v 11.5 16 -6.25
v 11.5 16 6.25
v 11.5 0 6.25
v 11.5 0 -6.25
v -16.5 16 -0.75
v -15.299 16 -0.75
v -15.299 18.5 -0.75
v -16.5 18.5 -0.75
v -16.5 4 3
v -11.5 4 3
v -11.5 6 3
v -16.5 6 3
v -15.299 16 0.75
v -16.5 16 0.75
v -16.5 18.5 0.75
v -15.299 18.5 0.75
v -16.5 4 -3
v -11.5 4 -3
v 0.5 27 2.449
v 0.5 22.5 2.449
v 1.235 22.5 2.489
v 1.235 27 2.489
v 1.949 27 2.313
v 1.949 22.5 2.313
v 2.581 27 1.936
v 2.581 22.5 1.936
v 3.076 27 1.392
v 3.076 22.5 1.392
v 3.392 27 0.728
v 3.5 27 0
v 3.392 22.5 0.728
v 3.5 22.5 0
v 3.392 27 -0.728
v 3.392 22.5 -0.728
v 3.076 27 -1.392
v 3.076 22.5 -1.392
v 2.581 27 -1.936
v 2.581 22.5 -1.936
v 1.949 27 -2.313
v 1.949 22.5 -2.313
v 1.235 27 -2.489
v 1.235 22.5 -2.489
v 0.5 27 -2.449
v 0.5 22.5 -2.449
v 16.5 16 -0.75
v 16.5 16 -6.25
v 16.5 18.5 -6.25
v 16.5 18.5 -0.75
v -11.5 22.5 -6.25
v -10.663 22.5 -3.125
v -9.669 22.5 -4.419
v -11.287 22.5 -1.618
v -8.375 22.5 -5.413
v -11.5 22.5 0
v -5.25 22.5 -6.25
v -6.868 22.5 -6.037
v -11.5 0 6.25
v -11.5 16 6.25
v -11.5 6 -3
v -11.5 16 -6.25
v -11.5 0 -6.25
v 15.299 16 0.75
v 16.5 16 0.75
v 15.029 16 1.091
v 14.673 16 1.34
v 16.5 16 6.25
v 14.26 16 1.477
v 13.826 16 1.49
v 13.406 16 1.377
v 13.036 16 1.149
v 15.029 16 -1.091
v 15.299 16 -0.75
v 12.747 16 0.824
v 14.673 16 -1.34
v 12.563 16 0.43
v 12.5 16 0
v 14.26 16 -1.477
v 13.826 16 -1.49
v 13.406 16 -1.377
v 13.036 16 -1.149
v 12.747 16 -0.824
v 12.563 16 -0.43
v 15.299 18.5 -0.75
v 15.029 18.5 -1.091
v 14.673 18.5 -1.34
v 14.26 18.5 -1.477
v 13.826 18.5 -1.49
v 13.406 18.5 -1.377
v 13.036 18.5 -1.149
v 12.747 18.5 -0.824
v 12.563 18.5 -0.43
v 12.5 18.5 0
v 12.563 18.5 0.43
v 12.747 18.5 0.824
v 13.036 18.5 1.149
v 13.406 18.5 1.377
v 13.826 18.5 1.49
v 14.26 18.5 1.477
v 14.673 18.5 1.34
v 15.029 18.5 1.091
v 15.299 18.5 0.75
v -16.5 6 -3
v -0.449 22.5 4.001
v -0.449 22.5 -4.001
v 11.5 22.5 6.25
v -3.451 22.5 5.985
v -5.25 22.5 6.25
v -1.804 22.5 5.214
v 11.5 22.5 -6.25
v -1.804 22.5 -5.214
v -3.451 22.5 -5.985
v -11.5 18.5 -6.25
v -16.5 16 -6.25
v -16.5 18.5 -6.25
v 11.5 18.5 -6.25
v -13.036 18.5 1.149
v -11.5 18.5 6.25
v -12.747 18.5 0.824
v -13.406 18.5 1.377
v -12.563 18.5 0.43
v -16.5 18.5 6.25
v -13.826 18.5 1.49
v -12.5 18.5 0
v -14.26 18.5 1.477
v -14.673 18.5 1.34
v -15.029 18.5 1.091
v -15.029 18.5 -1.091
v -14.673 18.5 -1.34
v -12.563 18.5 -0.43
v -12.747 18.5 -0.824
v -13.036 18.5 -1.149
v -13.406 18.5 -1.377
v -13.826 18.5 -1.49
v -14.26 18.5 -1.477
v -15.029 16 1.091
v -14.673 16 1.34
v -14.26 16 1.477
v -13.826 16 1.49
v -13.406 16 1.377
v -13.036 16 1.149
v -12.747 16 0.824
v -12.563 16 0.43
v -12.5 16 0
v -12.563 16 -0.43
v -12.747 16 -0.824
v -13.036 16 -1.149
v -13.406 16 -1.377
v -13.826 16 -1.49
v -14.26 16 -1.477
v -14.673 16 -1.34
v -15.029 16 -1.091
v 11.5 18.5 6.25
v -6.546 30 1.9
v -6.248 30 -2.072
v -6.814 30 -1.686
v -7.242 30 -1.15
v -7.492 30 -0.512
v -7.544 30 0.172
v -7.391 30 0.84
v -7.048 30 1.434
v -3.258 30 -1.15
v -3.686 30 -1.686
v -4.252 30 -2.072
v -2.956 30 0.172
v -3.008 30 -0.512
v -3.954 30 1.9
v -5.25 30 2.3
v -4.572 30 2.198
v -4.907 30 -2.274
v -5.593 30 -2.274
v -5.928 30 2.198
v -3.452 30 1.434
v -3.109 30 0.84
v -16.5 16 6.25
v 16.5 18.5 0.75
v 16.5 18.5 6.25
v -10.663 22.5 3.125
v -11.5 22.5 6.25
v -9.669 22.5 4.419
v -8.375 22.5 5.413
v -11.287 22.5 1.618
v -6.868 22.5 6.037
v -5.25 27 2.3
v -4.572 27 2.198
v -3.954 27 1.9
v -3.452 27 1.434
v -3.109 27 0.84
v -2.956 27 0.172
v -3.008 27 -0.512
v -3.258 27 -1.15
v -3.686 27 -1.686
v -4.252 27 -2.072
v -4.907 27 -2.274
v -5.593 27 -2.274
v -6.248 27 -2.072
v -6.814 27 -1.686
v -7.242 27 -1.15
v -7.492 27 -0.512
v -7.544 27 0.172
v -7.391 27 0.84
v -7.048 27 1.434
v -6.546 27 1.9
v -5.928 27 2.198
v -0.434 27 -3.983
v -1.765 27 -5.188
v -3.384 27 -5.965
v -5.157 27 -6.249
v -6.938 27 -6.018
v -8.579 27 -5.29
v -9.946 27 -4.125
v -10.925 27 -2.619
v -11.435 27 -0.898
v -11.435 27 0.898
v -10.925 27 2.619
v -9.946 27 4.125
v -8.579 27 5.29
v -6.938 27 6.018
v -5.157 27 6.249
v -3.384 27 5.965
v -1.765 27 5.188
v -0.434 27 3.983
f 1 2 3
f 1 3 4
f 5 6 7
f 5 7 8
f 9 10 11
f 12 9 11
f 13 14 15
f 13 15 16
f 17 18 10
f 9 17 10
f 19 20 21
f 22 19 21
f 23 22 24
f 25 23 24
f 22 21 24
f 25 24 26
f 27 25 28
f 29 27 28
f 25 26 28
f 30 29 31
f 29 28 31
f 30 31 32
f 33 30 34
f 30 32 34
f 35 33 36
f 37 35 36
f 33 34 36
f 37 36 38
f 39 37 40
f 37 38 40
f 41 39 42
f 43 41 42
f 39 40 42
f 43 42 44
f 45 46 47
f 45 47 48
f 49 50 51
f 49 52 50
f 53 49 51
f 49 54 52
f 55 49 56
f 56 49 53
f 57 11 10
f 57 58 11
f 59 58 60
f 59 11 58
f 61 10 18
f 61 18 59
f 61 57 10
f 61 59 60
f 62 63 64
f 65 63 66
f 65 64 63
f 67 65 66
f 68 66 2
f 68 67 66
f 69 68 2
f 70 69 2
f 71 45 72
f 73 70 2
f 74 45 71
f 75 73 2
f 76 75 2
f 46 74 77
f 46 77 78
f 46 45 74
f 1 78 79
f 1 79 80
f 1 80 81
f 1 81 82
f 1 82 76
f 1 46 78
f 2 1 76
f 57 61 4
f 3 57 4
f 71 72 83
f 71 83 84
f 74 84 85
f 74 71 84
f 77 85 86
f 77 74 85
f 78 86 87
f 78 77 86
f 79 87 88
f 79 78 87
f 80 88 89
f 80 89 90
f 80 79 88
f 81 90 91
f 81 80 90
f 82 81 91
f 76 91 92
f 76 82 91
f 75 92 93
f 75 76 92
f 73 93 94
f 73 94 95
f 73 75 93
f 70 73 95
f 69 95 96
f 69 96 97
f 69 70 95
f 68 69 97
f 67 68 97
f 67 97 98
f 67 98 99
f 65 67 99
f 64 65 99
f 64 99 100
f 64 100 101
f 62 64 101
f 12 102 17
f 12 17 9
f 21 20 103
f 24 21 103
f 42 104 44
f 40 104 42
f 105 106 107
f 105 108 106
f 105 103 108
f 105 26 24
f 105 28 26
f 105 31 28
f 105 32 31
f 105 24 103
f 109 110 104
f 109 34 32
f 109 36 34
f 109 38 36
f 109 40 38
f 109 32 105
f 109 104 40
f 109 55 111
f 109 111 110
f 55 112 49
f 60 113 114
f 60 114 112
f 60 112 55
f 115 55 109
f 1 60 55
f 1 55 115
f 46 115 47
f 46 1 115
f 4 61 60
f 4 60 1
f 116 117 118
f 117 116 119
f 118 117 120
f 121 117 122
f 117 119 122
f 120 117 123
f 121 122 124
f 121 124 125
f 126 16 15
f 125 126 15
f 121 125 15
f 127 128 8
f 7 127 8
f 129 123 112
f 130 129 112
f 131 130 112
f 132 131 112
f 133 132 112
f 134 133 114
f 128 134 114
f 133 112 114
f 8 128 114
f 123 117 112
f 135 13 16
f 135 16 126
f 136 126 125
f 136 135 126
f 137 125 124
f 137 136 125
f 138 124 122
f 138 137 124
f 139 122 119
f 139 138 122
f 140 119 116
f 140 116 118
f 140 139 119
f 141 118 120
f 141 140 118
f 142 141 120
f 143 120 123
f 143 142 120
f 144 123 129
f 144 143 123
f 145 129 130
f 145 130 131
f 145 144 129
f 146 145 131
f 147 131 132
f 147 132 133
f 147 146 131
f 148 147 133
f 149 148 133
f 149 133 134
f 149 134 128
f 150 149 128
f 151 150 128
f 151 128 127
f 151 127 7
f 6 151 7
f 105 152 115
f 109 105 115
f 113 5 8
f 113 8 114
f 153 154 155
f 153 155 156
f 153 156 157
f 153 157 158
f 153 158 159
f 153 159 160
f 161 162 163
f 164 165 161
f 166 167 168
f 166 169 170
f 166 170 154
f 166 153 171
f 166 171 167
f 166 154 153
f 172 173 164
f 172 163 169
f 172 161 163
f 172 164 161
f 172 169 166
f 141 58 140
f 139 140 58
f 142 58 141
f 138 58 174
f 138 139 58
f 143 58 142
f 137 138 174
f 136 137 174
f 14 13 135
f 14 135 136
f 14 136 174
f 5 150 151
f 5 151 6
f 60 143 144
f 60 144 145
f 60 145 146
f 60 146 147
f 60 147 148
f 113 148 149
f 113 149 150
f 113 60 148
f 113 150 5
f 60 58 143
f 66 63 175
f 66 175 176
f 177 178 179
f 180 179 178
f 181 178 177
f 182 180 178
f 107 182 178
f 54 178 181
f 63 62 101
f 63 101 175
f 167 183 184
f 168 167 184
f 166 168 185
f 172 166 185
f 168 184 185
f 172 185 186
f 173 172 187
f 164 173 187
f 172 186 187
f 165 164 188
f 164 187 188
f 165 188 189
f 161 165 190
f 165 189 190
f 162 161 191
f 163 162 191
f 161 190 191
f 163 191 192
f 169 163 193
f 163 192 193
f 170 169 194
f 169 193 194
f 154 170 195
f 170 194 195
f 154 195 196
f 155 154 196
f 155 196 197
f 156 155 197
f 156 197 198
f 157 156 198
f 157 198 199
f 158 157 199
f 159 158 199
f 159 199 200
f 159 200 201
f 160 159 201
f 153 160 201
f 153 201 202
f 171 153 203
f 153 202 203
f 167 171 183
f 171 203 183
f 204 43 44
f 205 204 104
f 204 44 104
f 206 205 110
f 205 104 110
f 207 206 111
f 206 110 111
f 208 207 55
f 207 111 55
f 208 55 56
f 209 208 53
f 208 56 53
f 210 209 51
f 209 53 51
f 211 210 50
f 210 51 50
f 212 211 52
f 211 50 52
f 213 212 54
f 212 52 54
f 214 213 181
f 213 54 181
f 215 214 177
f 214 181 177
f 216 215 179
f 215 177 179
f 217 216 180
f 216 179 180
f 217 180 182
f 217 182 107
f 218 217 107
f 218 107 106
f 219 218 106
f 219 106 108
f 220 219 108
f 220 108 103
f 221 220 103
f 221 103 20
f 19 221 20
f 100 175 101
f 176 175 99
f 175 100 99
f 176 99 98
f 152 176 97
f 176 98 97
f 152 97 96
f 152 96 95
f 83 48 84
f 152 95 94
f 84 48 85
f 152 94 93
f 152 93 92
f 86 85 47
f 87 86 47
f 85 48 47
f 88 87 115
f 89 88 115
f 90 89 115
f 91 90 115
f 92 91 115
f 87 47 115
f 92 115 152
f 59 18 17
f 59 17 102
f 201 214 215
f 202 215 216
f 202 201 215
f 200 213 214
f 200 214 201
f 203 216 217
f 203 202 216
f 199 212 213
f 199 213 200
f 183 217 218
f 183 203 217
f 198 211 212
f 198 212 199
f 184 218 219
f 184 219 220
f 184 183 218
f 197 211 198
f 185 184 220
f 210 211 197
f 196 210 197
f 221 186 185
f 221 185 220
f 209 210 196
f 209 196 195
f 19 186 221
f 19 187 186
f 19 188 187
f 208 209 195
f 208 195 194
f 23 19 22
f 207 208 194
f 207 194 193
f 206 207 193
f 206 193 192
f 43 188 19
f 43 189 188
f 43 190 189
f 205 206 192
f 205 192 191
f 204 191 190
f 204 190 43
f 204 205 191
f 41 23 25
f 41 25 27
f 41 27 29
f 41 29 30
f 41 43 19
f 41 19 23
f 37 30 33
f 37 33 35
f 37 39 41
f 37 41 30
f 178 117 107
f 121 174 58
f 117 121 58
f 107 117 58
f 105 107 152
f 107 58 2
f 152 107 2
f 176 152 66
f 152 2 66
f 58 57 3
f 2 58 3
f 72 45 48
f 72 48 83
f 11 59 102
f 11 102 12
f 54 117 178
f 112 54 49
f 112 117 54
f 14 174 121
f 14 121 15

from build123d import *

# Parameters (mm, degrees)
SKETCH1_W           = 23
SKETCH1_H           = 12.5
BOSS_EXTRUDE1_DEPTH = 22.5
BOSS_EXTRUDE2_DEPTH = 2.5
BOSS_EXTRUDE3_DEPTH = 4.5
SKETCH4_R           = 2.3
BOSS_EXTRUDE4_DEPTH = 3
SKETCH6_W           = 6
SKETCH6_H           = 2
BOSS_EXTRUDE6_DEPTH = 5


with BuildPart() as part:
    # Sketch1 → Boss-Extrude1 (new body)
    with BuildSketch(Plane(origin=(0, 0, 0), x_dir=(1, 0, 0), z_dir=(0, 1, 0))):
        Rectangle(SKETCH1_W, SKETCH1_H)
    extrude(amount=BOSS_EXTRUDE1_DEPTH)

    # Sketch2 → Boss-Extrude2 (add)
    with BuildSketch(Plane(origin=(0, 16, 0), x_dir=(1, 0, 0), z_dir=(0, 1, 0))):
        with BuildLine():
            Line((11.5, 6.25), (16.5, 6.25))
            Line((16.5, 6.25), (16.5, 0.75))
            Line((16.5, 0.75), (15.299038106, 0.75))
            ThreePointArc((15.299038106, 0.75), (12.5, 0), (15.299038106, -0.75))
            Line((15.299038106, -0.75), (16.5, -0.75))
            Line((16.5, -0.75), (16.5, -6.25))
            Line((16.5, -6.25), (11.5, -6.25))
            Line((11.5, -6.25), (11.5, 6.25))
        make_face()
        with BuildLine():
            Line((-11.5, 6.25), (-11.5, -6.25))
            Line((-11.5, -6.25), (-16.5, -6.25))
            Line((-16.5, -6.25), (-16.5, -0.75))
            Line((-16.5, -0.75), (-15.299038106, -0.75))
            ThreePointArc((-15.299038106, -0.75), (-12.5, 0), (-15.299038106, 0.75))
            Line((-15.299038106, 0.75), (-16.5, 0.75))
            Line((-16.5, 0.75), (-16.5, 6.25))
            Line((-16.5, 6.25), (-11.5, 6.25))
        make_face()
    extrude(amount=BOSS_EXTRUDE2_DEPTH)

    # Sketch3 → Boss-Extrude3 (add)
    with BuildSketch(Plane(origin=(0, 22.5, 0), x_dir=(1, 0, 0), z_dir=(0, 1, 0))):
        with BuildLine():
            ThreePointArc((0.5, 2.449489743), (-11.5, 0), (0.5, -2.449489743))
            ThreePointArc((0.5, -2.449489743), (3.5, 0), (0.5, 2.449489743))
        make_face()
    extrude(amount=BOSS_EXTRUDE3_DEPTH)

    # Sketch4 → Boss-Extrude4 (add)
    with BuildSketch(Plane(origin=(0, 27, 0), x_dir=(1, 0, 0), z_dir=(0, 1, 0))):
        with Locations(Location((-5.25, 0, 0), (0, 0, 270))):
            Circle(SKETCH4_R)
    extrude(amount=BOSS_EXTRUDE4_DEPTH)

    # Sketch6 → Boss-Extrude6 (add)
    with BuildSketch(Plane.ZY.offset(11.5)):
        with Locations((0, 5)):
            Rectangle(SKETCH6_W, SKETCH6_H)
    extrude(amount=BOSS_EXTRUDE6_DEPTH)


solid = part.part
